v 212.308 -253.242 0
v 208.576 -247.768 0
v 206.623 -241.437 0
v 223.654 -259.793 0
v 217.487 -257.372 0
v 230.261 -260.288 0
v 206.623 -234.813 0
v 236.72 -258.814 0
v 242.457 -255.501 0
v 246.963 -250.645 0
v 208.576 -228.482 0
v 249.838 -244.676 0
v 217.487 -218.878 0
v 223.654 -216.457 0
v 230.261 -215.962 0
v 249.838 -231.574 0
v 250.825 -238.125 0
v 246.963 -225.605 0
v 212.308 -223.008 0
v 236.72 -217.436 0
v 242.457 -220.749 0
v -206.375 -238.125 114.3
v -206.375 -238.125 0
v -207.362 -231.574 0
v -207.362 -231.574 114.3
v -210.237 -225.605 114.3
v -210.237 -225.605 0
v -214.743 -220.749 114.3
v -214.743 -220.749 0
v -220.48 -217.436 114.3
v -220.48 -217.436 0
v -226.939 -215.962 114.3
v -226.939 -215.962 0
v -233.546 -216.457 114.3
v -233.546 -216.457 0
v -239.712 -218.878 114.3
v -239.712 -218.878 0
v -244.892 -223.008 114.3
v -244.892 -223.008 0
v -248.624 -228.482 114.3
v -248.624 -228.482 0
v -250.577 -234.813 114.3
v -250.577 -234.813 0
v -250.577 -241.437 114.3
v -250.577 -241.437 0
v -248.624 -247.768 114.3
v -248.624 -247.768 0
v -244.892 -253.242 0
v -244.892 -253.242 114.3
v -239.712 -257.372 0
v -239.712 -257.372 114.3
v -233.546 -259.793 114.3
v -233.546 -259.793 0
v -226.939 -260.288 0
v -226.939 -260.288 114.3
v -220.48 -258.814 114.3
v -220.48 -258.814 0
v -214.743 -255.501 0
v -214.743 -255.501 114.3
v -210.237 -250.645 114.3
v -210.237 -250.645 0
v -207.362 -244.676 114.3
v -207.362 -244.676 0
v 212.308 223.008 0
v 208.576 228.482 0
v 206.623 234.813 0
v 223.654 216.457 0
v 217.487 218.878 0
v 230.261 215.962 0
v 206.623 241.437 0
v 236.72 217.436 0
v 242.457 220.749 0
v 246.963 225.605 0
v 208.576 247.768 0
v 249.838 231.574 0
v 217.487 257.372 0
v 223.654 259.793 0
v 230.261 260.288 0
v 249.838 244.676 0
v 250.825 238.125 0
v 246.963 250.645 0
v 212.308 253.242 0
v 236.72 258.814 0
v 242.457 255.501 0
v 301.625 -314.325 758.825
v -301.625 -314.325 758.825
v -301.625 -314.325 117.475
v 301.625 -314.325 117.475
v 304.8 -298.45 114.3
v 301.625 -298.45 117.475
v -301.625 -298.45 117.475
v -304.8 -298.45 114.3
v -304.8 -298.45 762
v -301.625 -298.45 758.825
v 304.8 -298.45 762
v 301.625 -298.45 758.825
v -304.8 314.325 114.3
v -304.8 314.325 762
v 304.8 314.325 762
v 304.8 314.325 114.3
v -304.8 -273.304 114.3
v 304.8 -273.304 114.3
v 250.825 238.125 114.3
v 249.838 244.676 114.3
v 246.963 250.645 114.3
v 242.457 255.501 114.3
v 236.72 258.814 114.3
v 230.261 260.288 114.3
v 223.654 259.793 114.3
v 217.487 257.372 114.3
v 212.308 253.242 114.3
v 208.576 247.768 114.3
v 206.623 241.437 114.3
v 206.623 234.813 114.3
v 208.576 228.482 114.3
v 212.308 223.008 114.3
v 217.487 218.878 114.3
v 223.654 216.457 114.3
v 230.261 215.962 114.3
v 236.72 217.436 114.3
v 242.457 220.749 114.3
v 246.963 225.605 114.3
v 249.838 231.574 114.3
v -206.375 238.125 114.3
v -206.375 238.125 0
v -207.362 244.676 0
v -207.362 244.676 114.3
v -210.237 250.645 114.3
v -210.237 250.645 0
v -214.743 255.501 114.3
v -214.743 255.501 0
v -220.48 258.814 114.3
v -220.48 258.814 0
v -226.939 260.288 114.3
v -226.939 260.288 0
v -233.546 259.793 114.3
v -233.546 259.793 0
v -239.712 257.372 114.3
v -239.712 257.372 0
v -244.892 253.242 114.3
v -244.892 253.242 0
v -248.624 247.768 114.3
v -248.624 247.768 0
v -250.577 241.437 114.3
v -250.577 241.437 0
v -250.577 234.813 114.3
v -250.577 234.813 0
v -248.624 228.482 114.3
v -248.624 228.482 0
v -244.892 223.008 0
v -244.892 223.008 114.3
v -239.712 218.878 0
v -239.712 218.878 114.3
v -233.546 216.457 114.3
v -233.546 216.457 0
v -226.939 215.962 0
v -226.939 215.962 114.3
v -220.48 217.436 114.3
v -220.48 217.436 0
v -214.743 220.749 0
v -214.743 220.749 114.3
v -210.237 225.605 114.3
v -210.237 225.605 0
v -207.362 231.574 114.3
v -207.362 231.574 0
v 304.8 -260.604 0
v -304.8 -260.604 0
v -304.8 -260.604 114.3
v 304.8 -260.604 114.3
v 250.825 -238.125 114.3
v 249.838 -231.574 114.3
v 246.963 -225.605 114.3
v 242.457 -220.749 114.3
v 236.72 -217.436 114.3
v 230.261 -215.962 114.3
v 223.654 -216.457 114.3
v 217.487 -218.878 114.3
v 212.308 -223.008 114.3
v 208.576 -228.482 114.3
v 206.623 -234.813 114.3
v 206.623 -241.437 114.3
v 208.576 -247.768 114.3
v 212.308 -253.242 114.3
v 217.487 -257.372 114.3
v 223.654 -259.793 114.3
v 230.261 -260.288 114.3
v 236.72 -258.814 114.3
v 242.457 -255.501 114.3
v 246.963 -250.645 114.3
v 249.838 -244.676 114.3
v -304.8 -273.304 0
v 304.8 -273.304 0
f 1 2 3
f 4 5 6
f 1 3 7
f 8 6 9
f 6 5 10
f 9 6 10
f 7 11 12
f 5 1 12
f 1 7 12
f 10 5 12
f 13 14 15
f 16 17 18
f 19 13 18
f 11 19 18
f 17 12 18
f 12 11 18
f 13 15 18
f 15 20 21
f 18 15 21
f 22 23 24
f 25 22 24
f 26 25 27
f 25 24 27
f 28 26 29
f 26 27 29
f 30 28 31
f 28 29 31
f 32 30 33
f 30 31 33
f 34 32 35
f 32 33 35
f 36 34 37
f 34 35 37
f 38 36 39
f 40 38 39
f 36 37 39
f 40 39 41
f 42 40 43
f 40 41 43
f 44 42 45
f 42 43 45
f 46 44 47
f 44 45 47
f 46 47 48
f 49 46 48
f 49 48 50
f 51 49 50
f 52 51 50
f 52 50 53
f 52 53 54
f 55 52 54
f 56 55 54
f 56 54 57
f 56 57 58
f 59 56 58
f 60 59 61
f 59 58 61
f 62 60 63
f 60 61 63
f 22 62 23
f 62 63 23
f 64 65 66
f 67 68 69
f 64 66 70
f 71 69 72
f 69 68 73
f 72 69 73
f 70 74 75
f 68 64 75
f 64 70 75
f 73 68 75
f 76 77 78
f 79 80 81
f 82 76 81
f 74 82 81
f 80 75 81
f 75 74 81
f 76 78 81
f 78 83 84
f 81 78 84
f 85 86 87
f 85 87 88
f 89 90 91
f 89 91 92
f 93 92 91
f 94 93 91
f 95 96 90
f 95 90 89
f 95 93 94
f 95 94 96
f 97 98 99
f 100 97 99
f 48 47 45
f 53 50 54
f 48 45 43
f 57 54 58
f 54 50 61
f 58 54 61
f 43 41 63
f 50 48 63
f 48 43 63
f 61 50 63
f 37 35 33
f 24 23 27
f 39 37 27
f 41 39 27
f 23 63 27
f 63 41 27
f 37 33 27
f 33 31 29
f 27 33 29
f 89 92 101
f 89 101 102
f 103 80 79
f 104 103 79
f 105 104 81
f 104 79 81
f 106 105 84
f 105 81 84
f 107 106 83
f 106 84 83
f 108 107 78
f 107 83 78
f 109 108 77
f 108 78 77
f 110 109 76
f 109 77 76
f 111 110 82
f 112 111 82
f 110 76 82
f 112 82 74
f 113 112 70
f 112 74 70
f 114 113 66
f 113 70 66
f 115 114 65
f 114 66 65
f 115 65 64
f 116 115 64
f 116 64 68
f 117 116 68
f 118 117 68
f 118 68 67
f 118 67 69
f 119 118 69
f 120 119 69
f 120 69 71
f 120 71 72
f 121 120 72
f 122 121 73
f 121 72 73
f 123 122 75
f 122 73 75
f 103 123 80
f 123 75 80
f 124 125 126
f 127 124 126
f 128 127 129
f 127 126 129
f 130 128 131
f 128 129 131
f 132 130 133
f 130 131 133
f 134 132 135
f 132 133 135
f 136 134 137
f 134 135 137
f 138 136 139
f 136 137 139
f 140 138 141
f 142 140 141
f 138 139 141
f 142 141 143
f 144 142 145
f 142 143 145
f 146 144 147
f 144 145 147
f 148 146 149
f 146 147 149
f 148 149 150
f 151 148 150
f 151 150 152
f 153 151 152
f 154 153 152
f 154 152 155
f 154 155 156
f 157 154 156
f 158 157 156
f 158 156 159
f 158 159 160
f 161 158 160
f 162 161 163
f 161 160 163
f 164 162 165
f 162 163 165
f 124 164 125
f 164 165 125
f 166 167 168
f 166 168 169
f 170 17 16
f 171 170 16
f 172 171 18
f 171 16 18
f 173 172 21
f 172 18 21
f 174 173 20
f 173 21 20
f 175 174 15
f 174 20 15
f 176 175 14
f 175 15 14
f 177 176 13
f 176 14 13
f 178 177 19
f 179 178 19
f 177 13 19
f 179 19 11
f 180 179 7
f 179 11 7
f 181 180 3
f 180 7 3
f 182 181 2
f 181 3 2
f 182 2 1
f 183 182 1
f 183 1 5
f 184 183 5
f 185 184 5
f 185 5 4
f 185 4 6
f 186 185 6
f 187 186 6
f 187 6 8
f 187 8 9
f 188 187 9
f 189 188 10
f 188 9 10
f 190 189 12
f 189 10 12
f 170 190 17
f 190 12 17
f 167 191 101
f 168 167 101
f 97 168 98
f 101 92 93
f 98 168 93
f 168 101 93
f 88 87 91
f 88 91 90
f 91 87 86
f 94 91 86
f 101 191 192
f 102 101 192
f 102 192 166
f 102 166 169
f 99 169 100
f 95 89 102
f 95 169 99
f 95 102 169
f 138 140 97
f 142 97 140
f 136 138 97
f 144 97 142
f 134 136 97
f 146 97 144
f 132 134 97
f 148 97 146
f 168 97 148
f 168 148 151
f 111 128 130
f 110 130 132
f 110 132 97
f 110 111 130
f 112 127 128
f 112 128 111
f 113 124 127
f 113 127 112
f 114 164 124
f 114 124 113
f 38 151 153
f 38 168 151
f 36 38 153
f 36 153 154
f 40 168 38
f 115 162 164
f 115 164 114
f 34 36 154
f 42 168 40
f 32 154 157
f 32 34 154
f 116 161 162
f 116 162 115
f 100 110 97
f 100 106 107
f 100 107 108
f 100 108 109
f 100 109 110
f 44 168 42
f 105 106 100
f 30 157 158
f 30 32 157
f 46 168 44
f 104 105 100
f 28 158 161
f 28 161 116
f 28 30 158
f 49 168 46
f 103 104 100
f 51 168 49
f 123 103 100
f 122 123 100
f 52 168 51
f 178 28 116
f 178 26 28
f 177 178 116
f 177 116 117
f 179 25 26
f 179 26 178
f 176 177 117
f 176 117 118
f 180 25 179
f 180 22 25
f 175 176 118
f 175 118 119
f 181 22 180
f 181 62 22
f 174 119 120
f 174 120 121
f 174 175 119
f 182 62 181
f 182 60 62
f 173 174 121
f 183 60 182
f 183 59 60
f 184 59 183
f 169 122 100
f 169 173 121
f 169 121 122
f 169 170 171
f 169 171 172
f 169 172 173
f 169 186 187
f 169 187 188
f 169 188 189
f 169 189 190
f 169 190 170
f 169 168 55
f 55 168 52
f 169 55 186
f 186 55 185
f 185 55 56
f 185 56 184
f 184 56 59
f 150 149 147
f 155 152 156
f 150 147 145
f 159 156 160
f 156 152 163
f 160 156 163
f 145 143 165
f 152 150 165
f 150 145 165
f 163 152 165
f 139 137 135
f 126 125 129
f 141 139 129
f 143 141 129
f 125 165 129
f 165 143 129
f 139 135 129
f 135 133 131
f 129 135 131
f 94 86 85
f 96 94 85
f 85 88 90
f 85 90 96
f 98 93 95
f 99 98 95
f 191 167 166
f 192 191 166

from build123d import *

# Parameters (mm, degrees)
F0_W     = 609.6
F0_H     = 647.7
F1_DEPTH = 314.325
F2_R     = 22.225
F3_DEPTH = 114.3
F4_W     = 609.6
F4_H     = 12.7
F5_DEPTH = 114.3
F6_W     = 609.6
F6_H     = 647.7
F6_W_2   = 603.25
F6_H_2   = 641.35
F7_DEPTH = 15.875


with BuildPart() as f1:
    # F0 (on Front) → F1 (new body, symmetric)
    with BuildSketch(Plane.XZ):
        with Locations((0, 438.15)):
            Rectangle(F0_W, F0_H)
    extrude(amount=F1_DEPTH, both=True)

    # F2 (on Top) → F3 (join)
    with BuildSketch(Plane.XY):
        with Locations((-228.6, -238.125)):
            Circle(F2_R)
        with Locations((228.6, -238.125)):
            Circle(F2_R)
        with Locations((228.6, 238.125)):
            Circle(F2_R)
        with Locations((-228.6, 238.125)):
            Circle(F2_R)
    extrude(amount=F3_DEPTH)

    # F4 (on Top) → F5 (join, through all)
    with BuildSketch(Plane.XY):
        with Locations((0, -266.954)):
            Rectangle(F4_W, F4_H)
    extrude(amount=F5_DEPTH)

    # F6 (on face) → F7 (cut)
    with BuildSketch(Plane.XZ.offset(314.325)):
        with Locations((0, 438.15)):
            Rectangle(F6_W, F6_H)
        with Locations((0, 438.15)):
            Rectangle(F6_W_2, F6_H_2, mode=Mode.SUBTRACT)
    extrude(amount=-F7_DEPTH, mode=Mode.SUBTRACT)


solid = f1.part
